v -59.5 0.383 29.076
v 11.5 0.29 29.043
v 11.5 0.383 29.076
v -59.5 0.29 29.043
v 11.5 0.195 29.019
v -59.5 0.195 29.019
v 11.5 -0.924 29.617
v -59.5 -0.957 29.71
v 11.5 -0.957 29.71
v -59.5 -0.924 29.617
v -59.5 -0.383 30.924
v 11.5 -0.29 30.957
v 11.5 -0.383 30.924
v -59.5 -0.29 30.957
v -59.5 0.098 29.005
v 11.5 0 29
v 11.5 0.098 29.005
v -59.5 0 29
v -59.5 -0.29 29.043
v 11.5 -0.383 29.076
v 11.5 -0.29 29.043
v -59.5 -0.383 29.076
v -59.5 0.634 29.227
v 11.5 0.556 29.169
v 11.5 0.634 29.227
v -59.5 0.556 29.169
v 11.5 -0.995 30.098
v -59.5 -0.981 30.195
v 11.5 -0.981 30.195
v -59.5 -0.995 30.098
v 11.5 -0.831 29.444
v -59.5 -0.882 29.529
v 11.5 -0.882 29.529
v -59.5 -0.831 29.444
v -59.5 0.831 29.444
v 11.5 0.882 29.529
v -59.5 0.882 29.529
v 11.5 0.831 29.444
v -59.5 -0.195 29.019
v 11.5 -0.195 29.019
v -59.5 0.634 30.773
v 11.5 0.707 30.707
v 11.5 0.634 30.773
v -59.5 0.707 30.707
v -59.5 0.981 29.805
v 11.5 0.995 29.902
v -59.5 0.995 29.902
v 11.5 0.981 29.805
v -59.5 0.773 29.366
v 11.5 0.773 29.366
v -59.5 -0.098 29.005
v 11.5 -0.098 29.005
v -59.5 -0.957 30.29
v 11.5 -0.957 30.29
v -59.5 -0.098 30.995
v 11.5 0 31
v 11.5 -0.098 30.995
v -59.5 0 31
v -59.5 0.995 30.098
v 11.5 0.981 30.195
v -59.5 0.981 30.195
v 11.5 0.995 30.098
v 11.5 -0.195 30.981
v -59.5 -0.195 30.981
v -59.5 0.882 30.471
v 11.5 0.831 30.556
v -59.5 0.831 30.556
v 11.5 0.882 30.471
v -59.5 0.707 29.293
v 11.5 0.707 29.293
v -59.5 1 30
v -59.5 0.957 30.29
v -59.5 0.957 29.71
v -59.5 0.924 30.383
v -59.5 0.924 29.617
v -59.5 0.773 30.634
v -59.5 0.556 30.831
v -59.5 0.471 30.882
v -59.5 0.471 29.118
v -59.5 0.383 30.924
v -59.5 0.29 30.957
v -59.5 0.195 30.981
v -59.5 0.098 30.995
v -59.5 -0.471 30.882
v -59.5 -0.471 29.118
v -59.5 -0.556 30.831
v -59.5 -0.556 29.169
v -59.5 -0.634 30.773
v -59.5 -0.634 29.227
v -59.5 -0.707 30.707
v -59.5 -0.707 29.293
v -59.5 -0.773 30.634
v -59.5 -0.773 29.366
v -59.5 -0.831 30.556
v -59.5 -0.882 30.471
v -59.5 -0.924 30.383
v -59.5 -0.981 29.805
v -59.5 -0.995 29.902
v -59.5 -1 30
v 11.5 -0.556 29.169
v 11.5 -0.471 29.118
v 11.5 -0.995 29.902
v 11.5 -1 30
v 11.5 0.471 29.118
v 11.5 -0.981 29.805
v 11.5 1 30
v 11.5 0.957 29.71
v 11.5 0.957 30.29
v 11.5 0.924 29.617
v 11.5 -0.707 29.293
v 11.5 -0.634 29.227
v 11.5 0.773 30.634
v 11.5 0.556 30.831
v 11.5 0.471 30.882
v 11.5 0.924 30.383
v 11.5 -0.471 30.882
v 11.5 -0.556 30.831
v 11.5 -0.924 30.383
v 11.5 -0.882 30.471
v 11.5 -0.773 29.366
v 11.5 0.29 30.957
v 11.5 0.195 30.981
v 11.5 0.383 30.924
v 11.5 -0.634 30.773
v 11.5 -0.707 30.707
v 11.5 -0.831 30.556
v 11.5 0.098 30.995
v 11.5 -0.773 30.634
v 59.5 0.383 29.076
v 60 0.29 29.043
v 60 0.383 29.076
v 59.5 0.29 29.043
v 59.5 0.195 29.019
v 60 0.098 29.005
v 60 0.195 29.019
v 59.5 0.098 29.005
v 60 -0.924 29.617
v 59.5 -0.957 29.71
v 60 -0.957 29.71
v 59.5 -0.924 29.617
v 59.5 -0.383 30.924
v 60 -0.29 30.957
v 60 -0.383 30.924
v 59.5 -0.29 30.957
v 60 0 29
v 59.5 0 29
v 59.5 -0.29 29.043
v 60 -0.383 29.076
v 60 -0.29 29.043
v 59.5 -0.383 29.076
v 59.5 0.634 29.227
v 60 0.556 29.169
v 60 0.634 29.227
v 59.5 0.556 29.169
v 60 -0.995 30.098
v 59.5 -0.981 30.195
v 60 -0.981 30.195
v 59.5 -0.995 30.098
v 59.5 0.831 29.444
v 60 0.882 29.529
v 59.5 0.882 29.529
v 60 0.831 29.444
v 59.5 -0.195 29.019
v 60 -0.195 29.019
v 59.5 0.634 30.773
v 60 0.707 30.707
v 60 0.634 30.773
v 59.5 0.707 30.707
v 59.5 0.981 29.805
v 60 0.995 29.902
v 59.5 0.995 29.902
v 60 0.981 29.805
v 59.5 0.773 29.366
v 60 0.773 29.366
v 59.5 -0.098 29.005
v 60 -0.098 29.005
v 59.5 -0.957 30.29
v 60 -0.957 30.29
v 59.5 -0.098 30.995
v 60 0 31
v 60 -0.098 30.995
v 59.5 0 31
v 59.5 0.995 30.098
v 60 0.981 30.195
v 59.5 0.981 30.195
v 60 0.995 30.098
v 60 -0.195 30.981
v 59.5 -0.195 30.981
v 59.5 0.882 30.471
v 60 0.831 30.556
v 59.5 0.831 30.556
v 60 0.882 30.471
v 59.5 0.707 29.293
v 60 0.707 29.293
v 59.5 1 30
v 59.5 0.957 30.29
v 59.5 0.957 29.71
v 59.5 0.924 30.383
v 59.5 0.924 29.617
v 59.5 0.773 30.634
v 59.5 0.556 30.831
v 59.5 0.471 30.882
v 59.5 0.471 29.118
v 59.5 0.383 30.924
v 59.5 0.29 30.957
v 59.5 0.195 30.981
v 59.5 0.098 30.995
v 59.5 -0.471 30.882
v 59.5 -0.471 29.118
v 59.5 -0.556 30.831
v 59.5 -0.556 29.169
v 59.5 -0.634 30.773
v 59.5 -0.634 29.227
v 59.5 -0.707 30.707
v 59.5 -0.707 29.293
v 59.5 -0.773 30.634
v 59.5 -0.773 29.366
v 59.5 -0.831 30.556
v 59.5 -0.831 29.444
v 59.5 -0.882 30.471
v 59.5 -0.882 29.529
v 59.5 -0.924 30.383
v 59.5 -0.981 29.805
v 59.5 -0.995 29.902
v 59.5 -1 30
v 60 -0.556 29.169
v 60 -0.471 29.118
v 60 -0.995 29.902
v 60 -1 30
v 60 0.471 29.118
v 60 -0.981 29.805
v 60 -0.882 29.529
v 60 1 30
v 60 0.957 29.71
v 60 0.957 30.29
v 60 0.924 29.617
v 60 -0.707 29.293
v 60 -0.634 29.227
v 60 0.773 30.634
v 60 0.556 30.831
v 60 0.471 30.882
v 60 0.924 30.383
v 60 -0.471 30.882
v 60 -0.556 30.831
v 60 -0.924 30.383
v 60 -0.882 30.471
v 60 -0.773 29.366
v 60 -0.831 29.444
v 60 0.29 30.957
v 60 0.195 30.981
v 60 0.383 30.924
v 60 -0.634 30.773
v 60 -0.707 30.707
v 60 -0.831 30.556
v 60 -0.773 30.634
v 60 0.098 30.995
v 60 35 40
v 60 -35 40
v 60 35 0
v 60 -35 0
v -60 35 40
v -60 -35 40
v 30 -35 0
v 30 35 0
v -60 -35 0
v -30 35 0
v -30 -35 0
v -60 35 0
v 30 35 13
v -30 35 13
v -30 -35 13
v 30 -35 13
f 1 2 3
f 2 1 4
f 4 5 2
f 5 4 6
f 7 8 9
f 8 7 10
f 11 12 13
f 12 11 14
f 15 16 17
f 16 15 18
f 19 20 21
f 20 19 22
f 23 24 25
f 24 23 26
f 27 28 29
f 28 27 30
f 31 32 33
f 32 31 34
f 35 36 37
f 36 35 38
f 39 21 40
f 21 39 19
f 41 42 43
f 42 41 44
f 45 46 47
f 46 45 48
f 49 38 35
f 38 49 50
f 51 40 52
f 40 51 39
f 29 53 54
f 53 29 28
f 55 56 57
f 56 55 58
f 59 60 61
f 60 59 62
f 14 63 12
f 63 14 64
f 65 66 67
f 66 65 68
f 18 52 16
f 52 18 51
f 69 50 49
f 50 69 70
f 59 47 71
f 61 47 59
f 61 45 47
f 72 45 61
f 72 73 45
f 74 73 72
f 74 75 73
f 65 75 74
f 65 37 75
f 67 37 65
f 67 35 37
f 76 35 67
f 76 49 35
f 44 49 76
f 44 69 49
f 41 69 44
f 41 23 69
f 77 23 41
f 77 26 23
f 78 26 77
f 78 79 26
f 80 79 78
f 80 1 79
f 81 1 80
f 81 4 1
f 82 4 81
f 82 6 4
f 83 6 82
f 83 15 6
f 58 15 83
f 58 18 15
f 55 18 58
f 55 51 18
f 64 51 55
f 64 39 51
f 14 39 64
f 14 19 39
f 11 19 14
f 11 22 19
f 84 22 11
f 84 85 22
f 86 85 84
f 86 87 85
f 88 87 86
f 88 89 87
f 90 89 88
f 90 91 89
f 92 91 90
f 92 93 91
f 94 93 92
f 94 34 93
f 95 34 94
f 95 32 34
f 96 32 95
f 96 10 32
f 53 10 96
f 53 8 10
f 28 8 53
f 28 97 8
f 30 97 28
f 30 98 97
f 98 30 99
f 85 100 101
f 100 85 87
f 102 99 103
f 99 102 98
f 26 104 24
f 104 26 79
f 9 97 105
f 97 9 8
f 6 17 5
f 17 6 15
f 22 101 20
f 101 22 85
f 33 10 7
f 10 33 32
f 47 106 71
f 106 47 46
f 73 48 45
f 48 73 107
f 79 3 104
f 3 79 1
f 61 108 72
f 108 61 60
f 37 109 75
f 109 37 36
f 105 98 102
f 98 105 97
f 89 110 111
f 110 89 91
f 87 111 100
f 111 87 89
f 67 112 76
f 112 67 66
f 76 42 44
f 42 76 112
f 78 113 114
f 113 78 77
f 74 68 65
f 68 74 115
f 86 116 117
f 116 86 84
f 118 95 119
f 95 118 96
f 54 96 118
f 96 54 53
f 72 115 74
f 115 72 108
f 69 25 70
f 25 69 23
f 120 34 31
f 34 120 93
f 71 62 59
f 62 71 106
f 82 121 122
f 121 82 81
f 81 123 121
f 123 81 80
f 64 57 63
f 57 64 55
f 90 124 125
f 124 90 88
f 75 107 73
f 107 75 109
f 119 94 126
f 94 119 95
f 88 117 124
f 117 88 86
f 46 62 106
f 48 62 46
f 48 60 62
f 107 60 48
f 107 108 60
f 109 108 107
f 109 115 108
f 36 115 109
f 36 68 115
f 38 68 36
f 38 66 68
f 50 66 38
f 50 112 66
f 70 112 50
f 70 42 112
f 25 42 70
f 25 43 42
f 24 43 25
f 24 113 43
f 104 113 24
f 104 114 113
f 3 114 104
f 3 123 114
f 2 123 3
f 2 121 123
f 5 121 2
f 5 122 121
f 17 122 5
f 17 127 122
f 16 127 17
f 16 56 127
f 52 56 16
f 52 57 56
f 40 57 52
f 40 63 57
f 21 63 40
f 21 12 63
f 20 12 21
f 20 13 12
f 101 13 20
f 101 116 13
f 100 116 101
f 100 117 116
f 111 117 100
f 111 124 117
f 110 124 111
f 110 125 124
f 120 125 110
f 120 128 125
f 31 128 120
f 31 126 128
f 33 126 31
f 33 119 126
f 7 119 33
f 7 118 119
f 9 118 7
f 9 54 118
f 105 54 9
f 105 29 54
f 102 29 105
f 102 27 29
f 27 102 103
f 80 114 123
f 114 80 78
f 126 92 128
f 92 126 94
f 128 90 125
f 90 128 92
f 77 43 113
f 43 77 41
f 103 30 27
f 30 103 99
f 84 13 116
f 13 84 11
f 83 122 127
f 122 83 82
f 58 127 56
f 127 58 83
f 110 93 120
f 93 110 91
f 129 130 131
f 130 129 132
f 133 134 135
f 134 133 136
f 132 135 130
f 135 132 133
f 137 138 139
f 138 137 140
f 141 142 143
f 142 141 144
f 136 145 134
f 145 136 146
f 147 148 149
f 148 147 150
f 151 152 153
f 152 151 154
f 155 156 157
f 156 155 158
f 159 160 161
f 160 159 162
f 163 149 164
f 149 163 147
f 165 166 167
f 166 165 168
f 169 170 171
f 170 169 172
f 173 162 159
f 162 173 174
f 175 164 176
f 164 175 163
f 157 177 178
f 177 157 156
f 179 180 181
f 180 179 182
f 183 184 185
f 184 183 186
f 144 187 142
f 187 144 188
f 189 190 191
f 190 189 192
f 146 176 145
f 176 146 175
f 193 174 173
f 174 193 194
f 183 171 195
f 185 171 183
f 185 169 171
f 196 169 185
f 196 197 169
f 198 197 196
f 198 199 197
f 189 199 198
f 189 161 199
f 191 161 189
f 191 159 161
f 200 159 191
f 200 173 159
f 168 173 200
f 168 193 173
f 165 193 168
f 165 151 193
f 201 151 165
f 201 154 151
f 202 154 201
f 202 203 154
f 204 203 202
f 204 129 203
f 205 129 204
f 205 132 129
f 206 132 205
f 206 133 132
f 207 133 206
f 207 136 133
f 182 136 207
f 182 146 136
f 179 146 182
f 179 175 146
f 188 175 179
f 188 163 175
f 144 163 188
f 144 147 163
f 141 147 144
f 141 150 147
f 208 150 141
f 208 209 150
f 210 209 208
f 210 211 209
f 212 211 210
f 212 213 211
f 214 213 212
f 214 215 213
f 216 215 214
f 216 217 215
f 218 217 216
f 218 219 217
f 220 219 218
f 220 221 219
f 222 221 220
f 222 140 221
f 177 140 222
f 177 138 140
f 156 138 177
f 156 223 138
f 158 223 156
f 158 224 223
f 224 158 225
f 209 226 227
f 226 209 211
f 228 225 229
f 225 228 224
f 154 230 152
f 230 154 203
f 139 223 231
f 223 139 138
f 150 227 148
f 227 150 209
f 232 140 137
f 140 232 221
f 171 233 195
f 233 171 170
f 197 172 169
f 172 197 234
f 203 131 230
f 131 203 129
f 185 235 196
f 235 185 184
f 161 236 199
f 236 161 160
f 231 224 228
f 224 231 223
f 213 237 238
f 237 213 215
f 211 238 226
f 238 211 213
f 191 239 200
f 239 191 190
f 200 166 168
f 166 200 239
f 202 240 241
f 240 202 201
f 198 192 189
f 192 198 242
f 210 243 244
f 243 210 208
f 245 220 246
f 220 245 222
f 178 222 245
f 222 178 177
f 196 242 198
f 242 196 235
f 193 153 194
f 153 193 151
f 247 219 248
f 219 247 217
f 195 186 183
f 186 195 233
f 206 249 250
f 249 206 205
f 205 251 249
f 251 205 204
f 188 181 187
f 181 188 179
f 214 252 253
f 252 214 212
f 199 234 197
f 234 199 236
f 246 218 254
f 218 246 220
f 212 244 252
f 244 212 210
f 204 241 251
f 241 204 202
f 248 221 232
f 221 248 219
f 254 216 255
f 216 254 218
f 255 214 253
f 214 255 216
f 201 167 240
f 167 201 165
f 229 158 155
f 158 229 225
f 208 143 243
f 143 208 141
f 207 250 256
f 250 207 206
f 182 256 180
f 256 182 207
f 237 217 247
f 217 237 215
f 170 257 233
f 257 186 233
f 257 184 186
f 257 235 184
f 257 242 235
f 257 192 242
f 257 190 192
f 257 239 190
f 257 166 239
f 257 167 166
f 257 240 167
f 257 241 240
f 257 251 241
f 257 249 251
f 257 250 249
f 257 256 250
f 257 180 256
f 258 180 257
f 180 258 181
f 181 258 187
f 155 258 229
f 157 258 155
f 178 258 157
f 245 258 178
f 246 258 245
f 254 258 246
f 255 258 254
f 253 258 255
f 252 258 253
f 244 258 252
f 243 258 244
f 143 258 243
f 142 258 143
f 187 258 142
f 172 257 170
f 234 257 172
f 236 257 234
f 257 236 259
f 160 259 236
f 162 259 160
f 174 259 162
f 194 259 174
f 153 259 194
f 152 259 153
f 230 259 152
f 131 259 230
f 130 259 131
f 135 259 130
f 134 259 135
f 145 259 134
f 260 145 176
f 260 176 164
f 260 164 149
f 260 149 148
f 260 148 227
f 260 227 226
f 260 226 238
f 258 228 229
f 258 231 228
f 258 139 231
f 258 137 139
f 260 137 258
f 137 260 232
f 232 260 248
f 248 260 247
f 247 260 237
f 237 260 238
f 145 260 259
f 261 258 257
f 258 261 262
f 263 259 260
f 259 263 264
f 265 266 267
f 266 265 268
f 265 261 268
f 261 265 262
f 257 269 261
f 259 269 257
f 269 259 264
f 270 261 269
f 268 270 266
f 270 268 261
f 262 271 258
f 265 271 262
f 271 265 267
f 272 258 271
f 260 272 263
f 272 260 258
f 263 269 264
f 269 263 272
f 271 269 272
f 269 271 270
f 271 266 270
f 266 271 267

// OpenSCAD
// Mini horizontal gel-electrophoresis buffer tank
// Print orientation: base on XY plane, open top, builds +Z

// ---- Tank dimensions ----
tank_x = 120;      // outer length along X (mm)
tank_y = 70;       // outer width along Y (mm)
tank_z = 40;       // outer height along Z (mm)
wall    = 3;       // wall thickness (mm)
floor   = 3;       // floor thickness (mm)

// ---- Platform dimensions ----
plat_len   = 60;   // platform length along X (mm)
plat_top_z = 13;   // platform top height (mm), floor + 10
$fn        = 64;   // curve resolution

// ---- Hole dimensions ----
hole_d = 2;        // electrode hole diameter (mm)
hole_y = 0;        // hole Y position (mm)
hole_z = 30;       // hole Z position (mm)

// ---- Cutting overlap ----
eps = 0.5;         // extension past cut faces (mm)

difference() {
    // Tank body
    translate([-tank_x/2, -tank_y/2, 0])
        cube([tank_x, tank_y, tank_z]);

    // Gel-tray platform (full inner width, centred in X)
    translate([-tank_x/2 + (tank_x - plat_len)/2, -tank_y/2, 0])
        cube([plat_len, tank_y, plat_top_z]);

    // Horizontal electrode holes through end walls along X
    for (sx = [-1, 1])
        translate([sx * (tank_x/2 - eps), hole_y, hole_z])
            rotate([0, 90, 0])
                cylinder(d = hole_d, h = tank_y + 2*eps);
}
